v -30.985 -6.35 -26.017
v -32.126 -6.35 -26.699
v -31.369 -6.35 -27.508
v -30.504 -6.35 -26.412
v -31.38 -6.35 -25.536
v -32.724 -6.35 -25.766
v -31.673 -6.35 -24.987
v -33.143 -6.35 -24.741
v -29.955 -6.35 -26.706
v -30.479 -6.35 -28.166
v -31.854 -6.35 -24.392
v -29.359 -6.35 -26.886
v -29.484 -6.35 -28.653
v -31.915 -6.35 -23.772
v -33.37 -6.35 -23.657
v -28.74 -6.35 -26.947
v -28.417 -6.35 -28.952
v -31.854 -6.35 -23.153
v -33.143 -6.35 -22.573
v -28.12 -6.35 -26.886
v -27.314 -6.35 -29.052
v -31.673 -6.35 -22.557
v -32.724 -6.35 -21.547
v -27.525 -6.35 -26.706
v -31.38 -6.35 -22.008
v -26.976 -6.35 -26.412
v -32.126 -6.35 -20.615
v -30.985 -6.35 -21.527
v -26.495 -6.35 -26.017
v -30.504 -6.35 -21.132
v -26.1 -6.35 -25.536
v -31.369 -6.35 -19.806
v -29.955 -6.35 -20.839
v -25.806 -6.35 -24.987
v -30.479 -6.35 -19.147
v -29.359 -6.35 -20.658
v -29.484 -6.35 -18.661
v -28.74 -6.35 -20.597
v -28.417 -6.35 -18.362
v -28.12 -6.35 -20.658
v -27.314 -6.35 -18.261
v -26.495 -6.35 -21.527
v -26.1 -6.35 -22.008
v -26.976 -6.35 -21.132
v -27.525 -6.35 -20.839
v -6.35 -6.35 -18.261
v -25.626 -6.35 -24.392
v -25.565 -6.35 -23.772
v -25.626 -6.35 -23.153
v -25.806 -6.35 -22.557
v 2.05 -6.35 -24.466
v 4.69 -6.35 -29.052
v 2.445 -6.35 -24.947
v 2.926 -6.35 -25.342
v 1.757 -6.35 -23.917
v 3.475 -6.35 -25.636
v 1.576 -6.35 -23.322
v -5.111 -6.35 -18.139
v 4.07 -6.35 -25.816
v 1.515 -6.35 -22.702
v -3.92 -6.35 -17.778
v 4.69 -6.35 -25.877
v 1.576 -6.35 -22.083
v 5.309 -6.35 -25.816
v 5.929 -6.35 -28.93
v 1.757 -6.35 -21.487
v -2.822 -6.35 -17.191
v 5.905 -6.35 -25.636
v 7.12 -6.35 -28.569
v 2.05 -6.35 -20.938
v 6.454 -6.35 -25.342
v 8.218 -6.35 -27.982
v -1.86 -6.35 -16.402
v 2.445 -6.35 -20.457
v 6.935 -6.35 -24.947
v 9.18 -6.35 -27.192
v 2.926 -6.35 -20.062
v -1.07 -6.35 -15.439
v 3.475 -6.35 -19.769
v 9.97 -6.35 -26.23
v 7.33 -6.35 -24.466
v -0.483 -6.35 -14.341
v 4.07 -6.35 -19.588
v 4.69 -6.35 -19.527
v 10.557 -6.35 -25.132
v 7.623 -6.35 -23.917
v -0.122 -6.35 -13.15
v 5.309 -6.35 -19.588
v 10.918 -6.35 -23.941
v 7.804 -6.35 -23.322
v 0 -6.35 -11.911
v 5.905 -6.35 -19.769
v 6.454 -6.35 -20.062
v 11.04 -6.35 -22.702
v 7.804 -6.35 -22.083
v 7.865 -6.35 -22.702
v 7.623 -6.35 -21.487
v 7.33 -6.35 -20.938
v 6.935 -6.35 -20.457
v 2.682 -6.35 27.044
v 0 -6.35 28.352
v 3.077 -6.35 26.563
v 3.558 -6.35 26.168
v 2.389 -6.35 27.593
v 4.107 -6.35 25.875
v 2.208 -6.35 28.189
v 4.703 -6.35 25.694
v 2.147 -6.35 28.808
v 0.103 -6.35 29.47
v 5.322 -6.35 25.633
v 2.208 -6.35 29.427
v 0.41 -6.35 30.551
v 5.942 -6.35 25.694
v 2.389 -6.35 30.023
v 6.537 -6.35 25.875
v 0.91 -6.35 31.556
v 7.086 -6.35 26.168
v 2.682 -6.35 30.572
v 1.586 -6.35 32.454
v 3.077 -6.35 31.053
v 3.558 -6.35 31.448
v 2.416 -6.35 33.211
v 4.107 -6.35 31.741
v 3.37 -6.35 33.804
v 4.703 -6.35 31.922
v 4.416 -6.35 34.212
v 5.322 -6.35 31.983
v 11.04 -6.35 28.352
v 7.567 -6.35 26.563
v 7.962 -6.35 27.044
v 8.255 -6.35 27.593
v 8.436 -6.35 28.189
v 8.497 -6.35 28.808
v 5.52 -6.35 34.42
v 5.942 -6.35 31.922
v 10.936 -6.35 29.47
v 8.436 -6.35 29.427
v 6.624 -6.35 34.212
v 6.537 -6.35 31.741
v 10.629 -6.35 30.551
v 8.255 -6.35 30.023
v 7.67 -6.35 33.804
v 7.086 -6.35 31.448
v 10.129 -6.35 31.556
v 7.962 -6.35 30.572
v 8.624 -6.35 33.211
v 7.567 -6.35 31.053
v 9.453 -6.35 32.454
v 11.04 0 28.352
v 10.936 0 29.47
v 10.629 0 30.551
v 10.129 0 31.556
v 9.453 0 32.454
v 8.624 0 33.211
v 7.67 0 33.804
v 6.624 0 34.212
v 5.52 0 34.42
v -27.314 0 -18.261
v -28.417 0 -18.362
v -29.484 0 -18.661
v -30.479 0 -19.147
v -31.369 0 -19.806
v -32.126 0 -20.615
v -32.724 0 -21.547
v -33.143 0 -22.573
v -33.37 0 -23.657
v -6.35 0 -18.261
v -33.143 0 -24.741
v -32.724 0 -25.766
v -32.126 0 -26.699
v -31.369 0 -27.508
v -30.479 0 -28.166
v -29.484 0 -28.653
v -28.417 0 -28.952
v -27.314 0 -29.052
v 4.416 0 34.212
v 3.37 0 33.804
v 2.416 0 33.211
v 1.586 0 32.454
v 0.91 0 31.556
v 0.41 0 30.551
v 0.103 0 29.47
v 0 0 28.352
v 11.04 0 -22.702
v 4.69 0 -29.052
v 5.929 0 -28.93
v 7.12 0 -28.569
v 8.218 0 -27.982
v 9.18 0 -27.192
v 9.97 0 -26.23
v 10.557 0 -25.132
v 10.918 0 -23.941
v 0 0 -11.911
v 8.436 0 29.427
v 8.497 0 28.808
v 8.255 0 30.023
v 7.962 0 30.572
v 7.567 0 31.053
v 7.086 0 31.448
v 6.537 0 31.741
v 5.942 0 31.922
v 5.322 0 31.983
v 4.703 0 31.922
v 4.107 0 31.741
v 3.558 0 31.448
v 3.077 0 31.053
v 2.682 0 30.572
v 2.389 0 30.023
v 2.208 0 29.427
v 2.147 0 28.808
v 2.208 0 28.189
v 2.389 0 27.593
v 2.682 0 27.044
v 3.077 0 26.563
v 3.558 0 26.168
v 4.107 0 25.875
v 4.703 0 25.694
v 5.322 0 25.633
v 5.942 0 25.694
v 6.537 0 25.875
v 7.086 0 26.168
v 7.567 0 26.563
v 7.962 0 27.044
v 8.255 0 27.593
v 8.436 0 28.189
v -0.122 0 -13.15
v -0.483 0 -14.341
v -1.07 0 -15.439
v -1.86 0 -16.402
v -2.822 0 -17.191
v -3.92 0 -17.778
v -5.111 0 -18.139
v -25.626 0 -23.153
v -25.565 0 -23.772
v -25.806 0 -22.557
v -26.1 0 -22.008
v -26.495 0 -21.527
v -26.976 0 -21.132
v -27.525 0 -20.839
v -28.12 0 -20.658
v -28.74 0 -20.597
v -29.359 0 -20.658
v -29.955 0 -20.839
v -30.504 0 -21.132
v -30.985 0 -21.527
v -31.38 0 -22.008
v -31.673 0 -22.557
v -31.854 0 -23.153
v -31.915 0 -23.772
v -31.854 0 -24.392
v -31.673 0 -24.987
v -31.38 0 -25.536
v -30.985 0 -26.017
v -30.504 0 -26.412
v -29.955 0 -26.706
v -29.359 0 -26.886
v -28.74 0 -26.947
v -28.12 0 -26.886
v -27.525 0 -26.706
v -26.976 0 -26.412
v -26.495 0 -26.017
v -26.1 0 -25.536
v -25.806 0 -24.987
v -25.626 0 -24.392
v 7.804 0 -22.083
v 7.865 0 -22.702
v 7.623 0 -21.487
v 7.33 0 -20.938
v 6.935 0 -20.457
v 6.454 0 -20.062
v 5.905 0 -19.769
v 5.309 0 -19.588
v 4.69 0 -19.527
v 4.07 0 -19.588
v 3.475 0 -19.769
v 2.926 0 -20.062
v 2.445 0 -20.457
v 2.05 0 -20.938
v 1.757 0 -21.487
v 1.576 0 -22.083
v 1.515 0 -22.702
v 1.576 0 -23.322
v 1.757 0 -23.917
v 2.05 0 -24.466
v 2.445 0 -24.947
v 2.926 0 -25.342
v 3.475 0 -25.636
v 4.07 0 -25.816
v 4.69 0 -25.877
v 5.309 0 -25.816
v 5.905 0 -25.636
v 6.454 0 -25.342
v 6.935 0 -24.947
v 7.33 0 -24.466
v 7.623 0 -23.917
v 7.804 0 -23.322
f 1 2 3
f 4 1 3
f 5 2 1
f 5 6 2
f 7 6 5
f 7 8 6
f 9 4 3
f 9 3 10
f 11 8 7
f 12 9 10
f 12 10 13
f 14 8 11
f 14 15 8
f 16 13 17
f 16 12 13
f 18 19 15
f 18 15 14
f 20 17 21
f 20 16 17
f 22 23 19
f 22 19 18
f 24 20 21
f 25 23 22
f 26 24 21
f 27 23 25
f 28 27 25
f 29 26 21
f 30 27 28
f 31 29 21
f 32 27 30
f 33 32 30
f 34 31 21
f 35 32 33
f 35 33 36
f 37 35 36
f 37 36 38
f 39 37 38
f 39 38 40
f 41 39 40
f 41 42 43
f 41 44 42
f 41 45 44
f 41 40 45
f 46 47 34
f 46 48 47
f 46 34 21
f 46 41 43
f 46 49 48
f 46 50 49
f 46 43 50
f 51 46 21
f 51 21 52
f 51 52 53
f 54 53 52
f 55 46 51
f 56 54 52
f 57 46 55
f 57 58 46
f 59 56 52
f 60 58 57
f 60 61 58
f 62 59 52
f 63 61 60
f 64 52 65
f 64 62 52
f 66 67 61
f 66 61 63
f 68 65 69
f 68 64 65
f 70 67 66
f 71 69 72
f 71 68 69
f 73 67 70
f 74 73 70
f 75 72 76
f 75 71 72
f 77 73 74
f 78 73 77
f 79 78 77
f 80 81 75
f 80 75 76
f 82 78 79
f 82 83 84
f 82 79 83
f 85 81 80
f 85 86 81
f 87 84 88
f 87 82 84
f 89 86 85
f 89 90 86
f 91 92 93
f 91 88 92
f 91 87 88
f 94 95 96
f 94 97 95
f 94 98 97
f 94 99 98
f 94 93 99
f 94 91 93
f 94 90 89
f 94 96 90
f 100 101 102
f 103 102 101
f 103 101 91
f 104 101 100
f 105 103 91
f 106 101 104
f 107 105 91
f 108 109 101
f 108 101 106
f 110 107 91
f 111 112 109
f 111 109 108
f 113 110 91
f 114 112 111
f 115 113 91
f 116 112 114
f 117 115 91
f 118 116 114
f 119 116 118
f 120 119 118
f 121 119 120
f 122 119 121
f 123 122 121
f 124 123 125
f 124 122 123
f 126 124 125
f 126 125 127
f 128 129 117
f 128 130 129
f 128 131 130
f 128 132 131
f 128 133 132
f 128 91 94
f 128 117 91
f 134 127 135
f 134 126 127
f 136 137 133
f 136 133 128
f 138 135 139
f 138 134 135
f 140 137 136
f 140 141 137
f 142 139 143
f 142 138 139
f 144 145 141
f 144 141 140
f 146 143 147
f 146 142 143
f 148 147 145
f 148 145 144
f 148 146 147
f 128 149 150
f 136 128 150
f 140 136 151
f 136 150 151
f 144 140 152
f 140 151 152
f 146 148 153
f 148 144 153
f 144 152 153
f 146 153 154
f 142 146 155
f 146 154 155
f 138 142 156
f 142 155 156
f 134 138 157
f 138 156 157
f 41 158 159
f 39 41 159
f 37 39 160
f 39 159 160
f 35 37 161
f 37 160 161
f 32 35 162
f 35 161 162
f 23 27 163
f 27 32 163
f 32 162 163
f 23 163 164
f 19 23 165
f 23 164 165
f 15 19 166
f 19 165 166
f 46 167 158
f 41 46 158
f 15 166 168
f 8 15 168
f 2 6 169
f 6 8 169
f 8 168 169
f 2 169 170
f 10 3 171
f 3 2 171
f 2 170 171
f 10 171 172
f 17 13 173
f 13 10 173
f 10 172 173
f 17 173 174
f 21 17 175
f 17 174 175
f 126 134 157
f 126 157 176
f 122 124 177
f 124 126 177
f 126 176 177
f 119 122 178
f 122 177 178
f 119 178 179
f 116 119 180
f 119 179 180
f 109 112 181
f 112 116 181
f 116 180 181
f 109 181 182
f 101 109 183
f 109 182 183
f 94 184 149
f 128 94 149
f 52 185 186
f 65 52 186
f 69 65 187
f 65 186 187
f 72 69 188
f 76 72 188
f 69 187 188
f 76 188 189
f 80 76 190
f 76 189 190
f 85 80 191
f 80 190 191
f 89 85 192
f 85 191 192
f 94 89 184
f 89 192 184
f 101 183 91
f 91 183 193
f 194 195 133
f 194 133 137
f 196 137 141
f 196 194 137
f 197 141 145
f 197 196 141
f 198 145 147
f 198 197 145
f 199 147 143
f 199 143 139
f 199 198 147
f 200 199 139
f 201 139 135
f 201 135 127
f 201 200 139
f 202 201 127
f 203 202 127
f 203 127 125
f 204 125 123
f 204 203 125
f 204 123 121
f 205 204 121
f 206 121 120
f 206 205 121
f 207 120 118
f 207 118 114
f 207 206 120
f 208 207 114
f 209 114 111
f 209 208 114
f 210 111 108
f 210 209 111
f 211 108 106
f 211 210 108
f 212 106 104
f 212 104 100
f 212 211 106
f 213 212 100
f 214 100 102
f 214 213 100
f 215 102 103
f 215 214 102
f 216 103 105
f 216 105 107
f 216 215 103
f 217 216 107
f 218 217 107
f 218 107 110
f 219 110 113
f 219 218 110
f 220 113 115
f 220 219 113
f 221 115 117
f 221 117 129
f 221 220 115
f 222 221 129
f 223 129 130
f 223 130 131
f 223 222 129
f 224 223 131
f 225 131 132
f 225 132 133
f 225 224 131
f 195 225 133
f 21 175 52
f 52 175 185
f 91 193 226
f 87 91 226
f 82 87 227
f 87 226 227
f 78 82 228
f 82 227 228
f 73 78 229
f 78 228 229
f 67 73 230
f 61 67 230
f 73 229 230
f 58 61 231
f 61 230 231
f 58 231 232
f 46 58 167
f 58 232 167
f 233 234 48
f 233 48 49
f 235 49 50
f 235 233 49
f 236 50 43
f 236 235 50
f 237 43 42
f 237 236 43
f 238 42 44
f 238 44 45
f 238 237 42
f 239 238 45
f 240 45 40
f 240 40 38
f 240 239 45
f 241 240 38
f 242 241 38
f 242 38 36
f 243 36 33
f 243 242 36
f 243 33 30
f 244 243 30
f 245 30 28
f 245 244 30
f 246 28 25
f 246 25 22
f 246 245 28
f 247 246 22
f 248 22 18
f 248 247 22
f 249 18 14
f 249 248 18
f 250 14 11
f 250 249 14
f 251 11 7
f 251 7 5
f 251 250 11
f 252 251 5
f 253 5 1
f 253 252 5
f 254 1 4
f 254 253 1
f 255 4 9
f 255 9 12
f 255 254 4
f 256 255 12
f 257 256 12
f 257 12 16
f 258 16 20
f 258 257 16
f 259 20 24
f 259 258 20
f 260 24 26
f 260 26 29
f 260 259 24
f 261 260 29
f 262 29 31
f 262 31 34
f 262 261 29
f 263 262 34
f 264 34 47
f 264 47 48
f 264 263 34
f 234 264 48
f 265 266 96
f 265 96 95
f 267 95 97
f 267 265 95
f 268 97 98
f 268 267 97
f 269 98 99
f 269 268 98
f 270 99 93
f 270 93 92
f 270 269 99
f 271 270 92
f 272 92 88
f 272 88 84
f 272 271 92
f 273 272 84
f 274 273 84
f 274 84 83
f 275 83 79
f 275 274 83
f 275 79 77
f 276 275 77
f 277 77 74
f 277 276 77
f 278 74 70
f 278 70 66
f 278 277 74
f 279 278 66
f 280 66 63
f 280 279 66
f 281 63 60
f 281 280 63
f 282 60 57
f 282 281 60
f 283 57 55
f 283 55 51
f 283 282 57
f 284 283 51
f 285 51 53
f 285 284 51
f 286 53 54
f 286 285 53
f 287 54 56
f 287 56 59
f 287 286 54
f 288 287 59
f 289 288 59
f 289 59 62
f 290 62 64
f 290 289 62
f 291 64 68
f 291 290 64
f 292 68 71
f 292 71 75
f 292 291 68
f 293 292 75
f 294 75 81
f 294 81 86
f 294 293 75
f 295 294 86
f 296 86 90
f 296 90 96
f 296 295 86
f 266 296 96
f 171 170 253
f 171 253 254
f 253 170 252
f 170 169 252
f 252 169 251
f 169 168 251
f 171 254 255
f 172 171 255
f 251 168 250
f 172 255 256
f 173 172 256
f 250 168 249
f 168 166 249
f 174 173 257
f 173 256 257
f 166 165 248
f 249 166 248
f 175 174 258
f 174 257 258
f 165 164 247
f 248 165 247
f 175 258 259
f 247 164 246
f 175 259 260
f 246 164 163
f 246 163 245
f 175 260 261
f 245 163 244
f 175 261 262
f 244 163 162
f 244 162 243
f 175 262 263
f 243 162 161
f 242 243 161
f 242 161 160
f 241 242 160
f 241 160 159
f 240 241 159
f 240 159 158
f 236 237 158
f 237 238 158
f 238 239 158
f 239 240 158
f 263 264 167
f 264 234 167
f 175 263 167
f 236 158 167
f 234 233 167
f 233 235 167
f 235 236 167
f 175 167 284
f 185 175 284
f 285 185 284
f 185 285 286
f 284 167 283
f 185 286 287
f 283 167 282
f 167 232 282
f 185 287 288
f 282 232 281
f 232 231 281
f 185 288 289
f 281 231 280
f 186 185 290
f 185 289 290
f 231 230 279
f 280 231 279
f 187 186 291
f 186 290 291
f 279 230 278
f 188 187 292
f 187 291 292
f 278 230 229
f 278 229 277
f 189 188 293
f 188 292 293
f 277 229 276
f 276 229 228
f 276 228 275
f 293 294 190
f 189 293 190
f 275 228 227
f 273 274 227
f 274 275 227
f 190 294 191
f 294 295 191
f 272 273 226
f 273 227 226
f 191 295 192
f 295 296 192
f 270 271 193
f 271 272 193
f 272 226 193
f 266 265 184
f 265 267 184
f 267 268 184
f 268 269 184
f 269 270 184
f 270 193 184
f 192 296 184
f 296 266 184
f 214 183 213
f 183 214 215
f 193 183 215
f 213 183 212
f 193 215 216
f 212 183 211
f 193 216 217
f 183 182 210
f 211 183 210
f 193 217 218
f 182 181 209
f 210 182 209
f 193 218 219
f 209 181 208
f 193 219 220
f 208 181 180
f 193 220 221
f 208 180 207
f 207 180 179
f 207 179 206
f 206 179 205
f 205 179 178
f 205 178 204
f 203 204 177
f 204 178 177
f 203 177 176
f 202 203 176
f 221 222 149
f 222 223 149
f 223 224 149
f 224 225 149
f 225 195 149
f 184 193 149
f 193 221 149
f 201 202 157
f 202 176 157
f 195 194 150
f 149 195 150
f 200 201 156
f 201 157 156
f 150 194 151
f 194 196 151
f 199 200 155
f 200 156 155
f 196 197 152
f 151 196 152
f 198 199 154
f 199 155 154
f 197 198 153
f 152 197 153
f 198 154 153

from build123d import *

# Parameters (mm, degrees)
F0_R        = 3.175
F1_DEPTH    = 6.35
F2_T1_DEPTH = 36.83
F3_T1_DEPTH = 36.83


# Not quite as in the source:
# - a fillet or chamfer that OpenCascade refuses, or shapes differently, is made with other operations: its cross-section is extruded or revolved along the edge and cut away or added


with BuildPart() as f1:
    # F0 (on Front) → F1 (new body)
    with BuildSketch(Plane.XZ):
        with BuildLine():
            Line((11.0398714598, -22.7022875817), (11.0398714598, 34.4477124183))
            Line((11.0398714598, 34.4477124183), (0, 34.4477124183))
            Line((0, 34.4477124183), (0, -11.9114368191))
            ThreePointArc((0, -11.9114368191), (-1.8598719395, -16.4015648796), (-6.35, -18.2614368191))
            Line((-6.35, -18.2614368191), (-33.4101285402, -18.2614368191))
            Line((-33.4101285402, -18.2614368191), (-33.4101285402, -29.0522875817))
            Line((-33.4101285402, -29.0522875817), (4.6898714598, -29.0522875817))
            ThreePointArc((4.6898714598, -29.0522875817), (9.1799995204, -27.1924156422), (11.0398714598, -22.7022875817))
        make_face()
        with Locations((-28.7397336215, -23.7723737955)):
            Circle(F0_R, mode=Mode.SUBTRACT)
        with Locations((4.6898714598, -22.7022875817)):
            Circle(F0_R, mode=Mode.SUBTRACT)
        with Locations((5.3221737035, 28.8079940212)):
            Circle(F0_R, mode=Mode.SUBTRACT)
    extrude(amount=F1_DEPTH)

    # F2: fillet of radius 6.096 on 2 edges, made by hand

    # F2_s2 → F2_t1 (cut)
    with BuildSketch(Plane.XZ.offset(-15.24)):
        with BuildLine():
            ThreePointArc((-27.3141285402, -18.2614368191), (-31.6246514783, -20.046913881), (-33.4101285402, -24.3574368191))
            Line((-33.4101285402, -24.3574368191), (-33.4101285402, -18.2614368191))
            Line((-33.4101285402, -18.2614368191), (-27.3141285402, -18.2614368191))
        make_face()
        with BuildLine():
            ThreePointArc((-33.4101285402, -22.9562875817), (-31.6246514783, -27.2668105198), (-27.3141285402, -29.0522875817))
            Line((-27.3141285402, -29.0522875817), (-33.4101285402, -29.0522875817))
            Line((-33.4101285402, -29.0522875817), (-33.4101285402, -22.9562875817))
        make_face()
    extrude(amount=F2_T1_DEPTH, mode=Mode.SUBTRACT)

    # F3: fillet of radius 6.096 on 2 edges, made by hand

    # F3_s2 → F3_t1 (cut)
    with BuildSketch(Plane.XZ.offset(-15.24)):
        with BuildLine():
            ThreePointArc((6.096, 34.4477124183), (1.7854770619, 32.6622353564), (0, 28.3517124183))
            Line((0, 28.3517124183), (0, 34.4477124183))
            Line((0, 34.4477124183), (6.096, 34.4477124183))
        make_face()
        with BuildLine():
            ThreePointArc((11.0398714598, 28.3517124183), (9.2543943979, 32.6622353564), (4.9438714598, 34.4477124183))
            Line((4.9438714598, 34.4477124183), (11.0398714598, 34.4477124183))
            Line((11.0398714598, 34.4477124183), (11.0398714598, 28.3517124183))
        make_face()
    extrude(amount=F3_T1_DEPTH, mode=Mode.SUBTRACT)


solid = f1.part
